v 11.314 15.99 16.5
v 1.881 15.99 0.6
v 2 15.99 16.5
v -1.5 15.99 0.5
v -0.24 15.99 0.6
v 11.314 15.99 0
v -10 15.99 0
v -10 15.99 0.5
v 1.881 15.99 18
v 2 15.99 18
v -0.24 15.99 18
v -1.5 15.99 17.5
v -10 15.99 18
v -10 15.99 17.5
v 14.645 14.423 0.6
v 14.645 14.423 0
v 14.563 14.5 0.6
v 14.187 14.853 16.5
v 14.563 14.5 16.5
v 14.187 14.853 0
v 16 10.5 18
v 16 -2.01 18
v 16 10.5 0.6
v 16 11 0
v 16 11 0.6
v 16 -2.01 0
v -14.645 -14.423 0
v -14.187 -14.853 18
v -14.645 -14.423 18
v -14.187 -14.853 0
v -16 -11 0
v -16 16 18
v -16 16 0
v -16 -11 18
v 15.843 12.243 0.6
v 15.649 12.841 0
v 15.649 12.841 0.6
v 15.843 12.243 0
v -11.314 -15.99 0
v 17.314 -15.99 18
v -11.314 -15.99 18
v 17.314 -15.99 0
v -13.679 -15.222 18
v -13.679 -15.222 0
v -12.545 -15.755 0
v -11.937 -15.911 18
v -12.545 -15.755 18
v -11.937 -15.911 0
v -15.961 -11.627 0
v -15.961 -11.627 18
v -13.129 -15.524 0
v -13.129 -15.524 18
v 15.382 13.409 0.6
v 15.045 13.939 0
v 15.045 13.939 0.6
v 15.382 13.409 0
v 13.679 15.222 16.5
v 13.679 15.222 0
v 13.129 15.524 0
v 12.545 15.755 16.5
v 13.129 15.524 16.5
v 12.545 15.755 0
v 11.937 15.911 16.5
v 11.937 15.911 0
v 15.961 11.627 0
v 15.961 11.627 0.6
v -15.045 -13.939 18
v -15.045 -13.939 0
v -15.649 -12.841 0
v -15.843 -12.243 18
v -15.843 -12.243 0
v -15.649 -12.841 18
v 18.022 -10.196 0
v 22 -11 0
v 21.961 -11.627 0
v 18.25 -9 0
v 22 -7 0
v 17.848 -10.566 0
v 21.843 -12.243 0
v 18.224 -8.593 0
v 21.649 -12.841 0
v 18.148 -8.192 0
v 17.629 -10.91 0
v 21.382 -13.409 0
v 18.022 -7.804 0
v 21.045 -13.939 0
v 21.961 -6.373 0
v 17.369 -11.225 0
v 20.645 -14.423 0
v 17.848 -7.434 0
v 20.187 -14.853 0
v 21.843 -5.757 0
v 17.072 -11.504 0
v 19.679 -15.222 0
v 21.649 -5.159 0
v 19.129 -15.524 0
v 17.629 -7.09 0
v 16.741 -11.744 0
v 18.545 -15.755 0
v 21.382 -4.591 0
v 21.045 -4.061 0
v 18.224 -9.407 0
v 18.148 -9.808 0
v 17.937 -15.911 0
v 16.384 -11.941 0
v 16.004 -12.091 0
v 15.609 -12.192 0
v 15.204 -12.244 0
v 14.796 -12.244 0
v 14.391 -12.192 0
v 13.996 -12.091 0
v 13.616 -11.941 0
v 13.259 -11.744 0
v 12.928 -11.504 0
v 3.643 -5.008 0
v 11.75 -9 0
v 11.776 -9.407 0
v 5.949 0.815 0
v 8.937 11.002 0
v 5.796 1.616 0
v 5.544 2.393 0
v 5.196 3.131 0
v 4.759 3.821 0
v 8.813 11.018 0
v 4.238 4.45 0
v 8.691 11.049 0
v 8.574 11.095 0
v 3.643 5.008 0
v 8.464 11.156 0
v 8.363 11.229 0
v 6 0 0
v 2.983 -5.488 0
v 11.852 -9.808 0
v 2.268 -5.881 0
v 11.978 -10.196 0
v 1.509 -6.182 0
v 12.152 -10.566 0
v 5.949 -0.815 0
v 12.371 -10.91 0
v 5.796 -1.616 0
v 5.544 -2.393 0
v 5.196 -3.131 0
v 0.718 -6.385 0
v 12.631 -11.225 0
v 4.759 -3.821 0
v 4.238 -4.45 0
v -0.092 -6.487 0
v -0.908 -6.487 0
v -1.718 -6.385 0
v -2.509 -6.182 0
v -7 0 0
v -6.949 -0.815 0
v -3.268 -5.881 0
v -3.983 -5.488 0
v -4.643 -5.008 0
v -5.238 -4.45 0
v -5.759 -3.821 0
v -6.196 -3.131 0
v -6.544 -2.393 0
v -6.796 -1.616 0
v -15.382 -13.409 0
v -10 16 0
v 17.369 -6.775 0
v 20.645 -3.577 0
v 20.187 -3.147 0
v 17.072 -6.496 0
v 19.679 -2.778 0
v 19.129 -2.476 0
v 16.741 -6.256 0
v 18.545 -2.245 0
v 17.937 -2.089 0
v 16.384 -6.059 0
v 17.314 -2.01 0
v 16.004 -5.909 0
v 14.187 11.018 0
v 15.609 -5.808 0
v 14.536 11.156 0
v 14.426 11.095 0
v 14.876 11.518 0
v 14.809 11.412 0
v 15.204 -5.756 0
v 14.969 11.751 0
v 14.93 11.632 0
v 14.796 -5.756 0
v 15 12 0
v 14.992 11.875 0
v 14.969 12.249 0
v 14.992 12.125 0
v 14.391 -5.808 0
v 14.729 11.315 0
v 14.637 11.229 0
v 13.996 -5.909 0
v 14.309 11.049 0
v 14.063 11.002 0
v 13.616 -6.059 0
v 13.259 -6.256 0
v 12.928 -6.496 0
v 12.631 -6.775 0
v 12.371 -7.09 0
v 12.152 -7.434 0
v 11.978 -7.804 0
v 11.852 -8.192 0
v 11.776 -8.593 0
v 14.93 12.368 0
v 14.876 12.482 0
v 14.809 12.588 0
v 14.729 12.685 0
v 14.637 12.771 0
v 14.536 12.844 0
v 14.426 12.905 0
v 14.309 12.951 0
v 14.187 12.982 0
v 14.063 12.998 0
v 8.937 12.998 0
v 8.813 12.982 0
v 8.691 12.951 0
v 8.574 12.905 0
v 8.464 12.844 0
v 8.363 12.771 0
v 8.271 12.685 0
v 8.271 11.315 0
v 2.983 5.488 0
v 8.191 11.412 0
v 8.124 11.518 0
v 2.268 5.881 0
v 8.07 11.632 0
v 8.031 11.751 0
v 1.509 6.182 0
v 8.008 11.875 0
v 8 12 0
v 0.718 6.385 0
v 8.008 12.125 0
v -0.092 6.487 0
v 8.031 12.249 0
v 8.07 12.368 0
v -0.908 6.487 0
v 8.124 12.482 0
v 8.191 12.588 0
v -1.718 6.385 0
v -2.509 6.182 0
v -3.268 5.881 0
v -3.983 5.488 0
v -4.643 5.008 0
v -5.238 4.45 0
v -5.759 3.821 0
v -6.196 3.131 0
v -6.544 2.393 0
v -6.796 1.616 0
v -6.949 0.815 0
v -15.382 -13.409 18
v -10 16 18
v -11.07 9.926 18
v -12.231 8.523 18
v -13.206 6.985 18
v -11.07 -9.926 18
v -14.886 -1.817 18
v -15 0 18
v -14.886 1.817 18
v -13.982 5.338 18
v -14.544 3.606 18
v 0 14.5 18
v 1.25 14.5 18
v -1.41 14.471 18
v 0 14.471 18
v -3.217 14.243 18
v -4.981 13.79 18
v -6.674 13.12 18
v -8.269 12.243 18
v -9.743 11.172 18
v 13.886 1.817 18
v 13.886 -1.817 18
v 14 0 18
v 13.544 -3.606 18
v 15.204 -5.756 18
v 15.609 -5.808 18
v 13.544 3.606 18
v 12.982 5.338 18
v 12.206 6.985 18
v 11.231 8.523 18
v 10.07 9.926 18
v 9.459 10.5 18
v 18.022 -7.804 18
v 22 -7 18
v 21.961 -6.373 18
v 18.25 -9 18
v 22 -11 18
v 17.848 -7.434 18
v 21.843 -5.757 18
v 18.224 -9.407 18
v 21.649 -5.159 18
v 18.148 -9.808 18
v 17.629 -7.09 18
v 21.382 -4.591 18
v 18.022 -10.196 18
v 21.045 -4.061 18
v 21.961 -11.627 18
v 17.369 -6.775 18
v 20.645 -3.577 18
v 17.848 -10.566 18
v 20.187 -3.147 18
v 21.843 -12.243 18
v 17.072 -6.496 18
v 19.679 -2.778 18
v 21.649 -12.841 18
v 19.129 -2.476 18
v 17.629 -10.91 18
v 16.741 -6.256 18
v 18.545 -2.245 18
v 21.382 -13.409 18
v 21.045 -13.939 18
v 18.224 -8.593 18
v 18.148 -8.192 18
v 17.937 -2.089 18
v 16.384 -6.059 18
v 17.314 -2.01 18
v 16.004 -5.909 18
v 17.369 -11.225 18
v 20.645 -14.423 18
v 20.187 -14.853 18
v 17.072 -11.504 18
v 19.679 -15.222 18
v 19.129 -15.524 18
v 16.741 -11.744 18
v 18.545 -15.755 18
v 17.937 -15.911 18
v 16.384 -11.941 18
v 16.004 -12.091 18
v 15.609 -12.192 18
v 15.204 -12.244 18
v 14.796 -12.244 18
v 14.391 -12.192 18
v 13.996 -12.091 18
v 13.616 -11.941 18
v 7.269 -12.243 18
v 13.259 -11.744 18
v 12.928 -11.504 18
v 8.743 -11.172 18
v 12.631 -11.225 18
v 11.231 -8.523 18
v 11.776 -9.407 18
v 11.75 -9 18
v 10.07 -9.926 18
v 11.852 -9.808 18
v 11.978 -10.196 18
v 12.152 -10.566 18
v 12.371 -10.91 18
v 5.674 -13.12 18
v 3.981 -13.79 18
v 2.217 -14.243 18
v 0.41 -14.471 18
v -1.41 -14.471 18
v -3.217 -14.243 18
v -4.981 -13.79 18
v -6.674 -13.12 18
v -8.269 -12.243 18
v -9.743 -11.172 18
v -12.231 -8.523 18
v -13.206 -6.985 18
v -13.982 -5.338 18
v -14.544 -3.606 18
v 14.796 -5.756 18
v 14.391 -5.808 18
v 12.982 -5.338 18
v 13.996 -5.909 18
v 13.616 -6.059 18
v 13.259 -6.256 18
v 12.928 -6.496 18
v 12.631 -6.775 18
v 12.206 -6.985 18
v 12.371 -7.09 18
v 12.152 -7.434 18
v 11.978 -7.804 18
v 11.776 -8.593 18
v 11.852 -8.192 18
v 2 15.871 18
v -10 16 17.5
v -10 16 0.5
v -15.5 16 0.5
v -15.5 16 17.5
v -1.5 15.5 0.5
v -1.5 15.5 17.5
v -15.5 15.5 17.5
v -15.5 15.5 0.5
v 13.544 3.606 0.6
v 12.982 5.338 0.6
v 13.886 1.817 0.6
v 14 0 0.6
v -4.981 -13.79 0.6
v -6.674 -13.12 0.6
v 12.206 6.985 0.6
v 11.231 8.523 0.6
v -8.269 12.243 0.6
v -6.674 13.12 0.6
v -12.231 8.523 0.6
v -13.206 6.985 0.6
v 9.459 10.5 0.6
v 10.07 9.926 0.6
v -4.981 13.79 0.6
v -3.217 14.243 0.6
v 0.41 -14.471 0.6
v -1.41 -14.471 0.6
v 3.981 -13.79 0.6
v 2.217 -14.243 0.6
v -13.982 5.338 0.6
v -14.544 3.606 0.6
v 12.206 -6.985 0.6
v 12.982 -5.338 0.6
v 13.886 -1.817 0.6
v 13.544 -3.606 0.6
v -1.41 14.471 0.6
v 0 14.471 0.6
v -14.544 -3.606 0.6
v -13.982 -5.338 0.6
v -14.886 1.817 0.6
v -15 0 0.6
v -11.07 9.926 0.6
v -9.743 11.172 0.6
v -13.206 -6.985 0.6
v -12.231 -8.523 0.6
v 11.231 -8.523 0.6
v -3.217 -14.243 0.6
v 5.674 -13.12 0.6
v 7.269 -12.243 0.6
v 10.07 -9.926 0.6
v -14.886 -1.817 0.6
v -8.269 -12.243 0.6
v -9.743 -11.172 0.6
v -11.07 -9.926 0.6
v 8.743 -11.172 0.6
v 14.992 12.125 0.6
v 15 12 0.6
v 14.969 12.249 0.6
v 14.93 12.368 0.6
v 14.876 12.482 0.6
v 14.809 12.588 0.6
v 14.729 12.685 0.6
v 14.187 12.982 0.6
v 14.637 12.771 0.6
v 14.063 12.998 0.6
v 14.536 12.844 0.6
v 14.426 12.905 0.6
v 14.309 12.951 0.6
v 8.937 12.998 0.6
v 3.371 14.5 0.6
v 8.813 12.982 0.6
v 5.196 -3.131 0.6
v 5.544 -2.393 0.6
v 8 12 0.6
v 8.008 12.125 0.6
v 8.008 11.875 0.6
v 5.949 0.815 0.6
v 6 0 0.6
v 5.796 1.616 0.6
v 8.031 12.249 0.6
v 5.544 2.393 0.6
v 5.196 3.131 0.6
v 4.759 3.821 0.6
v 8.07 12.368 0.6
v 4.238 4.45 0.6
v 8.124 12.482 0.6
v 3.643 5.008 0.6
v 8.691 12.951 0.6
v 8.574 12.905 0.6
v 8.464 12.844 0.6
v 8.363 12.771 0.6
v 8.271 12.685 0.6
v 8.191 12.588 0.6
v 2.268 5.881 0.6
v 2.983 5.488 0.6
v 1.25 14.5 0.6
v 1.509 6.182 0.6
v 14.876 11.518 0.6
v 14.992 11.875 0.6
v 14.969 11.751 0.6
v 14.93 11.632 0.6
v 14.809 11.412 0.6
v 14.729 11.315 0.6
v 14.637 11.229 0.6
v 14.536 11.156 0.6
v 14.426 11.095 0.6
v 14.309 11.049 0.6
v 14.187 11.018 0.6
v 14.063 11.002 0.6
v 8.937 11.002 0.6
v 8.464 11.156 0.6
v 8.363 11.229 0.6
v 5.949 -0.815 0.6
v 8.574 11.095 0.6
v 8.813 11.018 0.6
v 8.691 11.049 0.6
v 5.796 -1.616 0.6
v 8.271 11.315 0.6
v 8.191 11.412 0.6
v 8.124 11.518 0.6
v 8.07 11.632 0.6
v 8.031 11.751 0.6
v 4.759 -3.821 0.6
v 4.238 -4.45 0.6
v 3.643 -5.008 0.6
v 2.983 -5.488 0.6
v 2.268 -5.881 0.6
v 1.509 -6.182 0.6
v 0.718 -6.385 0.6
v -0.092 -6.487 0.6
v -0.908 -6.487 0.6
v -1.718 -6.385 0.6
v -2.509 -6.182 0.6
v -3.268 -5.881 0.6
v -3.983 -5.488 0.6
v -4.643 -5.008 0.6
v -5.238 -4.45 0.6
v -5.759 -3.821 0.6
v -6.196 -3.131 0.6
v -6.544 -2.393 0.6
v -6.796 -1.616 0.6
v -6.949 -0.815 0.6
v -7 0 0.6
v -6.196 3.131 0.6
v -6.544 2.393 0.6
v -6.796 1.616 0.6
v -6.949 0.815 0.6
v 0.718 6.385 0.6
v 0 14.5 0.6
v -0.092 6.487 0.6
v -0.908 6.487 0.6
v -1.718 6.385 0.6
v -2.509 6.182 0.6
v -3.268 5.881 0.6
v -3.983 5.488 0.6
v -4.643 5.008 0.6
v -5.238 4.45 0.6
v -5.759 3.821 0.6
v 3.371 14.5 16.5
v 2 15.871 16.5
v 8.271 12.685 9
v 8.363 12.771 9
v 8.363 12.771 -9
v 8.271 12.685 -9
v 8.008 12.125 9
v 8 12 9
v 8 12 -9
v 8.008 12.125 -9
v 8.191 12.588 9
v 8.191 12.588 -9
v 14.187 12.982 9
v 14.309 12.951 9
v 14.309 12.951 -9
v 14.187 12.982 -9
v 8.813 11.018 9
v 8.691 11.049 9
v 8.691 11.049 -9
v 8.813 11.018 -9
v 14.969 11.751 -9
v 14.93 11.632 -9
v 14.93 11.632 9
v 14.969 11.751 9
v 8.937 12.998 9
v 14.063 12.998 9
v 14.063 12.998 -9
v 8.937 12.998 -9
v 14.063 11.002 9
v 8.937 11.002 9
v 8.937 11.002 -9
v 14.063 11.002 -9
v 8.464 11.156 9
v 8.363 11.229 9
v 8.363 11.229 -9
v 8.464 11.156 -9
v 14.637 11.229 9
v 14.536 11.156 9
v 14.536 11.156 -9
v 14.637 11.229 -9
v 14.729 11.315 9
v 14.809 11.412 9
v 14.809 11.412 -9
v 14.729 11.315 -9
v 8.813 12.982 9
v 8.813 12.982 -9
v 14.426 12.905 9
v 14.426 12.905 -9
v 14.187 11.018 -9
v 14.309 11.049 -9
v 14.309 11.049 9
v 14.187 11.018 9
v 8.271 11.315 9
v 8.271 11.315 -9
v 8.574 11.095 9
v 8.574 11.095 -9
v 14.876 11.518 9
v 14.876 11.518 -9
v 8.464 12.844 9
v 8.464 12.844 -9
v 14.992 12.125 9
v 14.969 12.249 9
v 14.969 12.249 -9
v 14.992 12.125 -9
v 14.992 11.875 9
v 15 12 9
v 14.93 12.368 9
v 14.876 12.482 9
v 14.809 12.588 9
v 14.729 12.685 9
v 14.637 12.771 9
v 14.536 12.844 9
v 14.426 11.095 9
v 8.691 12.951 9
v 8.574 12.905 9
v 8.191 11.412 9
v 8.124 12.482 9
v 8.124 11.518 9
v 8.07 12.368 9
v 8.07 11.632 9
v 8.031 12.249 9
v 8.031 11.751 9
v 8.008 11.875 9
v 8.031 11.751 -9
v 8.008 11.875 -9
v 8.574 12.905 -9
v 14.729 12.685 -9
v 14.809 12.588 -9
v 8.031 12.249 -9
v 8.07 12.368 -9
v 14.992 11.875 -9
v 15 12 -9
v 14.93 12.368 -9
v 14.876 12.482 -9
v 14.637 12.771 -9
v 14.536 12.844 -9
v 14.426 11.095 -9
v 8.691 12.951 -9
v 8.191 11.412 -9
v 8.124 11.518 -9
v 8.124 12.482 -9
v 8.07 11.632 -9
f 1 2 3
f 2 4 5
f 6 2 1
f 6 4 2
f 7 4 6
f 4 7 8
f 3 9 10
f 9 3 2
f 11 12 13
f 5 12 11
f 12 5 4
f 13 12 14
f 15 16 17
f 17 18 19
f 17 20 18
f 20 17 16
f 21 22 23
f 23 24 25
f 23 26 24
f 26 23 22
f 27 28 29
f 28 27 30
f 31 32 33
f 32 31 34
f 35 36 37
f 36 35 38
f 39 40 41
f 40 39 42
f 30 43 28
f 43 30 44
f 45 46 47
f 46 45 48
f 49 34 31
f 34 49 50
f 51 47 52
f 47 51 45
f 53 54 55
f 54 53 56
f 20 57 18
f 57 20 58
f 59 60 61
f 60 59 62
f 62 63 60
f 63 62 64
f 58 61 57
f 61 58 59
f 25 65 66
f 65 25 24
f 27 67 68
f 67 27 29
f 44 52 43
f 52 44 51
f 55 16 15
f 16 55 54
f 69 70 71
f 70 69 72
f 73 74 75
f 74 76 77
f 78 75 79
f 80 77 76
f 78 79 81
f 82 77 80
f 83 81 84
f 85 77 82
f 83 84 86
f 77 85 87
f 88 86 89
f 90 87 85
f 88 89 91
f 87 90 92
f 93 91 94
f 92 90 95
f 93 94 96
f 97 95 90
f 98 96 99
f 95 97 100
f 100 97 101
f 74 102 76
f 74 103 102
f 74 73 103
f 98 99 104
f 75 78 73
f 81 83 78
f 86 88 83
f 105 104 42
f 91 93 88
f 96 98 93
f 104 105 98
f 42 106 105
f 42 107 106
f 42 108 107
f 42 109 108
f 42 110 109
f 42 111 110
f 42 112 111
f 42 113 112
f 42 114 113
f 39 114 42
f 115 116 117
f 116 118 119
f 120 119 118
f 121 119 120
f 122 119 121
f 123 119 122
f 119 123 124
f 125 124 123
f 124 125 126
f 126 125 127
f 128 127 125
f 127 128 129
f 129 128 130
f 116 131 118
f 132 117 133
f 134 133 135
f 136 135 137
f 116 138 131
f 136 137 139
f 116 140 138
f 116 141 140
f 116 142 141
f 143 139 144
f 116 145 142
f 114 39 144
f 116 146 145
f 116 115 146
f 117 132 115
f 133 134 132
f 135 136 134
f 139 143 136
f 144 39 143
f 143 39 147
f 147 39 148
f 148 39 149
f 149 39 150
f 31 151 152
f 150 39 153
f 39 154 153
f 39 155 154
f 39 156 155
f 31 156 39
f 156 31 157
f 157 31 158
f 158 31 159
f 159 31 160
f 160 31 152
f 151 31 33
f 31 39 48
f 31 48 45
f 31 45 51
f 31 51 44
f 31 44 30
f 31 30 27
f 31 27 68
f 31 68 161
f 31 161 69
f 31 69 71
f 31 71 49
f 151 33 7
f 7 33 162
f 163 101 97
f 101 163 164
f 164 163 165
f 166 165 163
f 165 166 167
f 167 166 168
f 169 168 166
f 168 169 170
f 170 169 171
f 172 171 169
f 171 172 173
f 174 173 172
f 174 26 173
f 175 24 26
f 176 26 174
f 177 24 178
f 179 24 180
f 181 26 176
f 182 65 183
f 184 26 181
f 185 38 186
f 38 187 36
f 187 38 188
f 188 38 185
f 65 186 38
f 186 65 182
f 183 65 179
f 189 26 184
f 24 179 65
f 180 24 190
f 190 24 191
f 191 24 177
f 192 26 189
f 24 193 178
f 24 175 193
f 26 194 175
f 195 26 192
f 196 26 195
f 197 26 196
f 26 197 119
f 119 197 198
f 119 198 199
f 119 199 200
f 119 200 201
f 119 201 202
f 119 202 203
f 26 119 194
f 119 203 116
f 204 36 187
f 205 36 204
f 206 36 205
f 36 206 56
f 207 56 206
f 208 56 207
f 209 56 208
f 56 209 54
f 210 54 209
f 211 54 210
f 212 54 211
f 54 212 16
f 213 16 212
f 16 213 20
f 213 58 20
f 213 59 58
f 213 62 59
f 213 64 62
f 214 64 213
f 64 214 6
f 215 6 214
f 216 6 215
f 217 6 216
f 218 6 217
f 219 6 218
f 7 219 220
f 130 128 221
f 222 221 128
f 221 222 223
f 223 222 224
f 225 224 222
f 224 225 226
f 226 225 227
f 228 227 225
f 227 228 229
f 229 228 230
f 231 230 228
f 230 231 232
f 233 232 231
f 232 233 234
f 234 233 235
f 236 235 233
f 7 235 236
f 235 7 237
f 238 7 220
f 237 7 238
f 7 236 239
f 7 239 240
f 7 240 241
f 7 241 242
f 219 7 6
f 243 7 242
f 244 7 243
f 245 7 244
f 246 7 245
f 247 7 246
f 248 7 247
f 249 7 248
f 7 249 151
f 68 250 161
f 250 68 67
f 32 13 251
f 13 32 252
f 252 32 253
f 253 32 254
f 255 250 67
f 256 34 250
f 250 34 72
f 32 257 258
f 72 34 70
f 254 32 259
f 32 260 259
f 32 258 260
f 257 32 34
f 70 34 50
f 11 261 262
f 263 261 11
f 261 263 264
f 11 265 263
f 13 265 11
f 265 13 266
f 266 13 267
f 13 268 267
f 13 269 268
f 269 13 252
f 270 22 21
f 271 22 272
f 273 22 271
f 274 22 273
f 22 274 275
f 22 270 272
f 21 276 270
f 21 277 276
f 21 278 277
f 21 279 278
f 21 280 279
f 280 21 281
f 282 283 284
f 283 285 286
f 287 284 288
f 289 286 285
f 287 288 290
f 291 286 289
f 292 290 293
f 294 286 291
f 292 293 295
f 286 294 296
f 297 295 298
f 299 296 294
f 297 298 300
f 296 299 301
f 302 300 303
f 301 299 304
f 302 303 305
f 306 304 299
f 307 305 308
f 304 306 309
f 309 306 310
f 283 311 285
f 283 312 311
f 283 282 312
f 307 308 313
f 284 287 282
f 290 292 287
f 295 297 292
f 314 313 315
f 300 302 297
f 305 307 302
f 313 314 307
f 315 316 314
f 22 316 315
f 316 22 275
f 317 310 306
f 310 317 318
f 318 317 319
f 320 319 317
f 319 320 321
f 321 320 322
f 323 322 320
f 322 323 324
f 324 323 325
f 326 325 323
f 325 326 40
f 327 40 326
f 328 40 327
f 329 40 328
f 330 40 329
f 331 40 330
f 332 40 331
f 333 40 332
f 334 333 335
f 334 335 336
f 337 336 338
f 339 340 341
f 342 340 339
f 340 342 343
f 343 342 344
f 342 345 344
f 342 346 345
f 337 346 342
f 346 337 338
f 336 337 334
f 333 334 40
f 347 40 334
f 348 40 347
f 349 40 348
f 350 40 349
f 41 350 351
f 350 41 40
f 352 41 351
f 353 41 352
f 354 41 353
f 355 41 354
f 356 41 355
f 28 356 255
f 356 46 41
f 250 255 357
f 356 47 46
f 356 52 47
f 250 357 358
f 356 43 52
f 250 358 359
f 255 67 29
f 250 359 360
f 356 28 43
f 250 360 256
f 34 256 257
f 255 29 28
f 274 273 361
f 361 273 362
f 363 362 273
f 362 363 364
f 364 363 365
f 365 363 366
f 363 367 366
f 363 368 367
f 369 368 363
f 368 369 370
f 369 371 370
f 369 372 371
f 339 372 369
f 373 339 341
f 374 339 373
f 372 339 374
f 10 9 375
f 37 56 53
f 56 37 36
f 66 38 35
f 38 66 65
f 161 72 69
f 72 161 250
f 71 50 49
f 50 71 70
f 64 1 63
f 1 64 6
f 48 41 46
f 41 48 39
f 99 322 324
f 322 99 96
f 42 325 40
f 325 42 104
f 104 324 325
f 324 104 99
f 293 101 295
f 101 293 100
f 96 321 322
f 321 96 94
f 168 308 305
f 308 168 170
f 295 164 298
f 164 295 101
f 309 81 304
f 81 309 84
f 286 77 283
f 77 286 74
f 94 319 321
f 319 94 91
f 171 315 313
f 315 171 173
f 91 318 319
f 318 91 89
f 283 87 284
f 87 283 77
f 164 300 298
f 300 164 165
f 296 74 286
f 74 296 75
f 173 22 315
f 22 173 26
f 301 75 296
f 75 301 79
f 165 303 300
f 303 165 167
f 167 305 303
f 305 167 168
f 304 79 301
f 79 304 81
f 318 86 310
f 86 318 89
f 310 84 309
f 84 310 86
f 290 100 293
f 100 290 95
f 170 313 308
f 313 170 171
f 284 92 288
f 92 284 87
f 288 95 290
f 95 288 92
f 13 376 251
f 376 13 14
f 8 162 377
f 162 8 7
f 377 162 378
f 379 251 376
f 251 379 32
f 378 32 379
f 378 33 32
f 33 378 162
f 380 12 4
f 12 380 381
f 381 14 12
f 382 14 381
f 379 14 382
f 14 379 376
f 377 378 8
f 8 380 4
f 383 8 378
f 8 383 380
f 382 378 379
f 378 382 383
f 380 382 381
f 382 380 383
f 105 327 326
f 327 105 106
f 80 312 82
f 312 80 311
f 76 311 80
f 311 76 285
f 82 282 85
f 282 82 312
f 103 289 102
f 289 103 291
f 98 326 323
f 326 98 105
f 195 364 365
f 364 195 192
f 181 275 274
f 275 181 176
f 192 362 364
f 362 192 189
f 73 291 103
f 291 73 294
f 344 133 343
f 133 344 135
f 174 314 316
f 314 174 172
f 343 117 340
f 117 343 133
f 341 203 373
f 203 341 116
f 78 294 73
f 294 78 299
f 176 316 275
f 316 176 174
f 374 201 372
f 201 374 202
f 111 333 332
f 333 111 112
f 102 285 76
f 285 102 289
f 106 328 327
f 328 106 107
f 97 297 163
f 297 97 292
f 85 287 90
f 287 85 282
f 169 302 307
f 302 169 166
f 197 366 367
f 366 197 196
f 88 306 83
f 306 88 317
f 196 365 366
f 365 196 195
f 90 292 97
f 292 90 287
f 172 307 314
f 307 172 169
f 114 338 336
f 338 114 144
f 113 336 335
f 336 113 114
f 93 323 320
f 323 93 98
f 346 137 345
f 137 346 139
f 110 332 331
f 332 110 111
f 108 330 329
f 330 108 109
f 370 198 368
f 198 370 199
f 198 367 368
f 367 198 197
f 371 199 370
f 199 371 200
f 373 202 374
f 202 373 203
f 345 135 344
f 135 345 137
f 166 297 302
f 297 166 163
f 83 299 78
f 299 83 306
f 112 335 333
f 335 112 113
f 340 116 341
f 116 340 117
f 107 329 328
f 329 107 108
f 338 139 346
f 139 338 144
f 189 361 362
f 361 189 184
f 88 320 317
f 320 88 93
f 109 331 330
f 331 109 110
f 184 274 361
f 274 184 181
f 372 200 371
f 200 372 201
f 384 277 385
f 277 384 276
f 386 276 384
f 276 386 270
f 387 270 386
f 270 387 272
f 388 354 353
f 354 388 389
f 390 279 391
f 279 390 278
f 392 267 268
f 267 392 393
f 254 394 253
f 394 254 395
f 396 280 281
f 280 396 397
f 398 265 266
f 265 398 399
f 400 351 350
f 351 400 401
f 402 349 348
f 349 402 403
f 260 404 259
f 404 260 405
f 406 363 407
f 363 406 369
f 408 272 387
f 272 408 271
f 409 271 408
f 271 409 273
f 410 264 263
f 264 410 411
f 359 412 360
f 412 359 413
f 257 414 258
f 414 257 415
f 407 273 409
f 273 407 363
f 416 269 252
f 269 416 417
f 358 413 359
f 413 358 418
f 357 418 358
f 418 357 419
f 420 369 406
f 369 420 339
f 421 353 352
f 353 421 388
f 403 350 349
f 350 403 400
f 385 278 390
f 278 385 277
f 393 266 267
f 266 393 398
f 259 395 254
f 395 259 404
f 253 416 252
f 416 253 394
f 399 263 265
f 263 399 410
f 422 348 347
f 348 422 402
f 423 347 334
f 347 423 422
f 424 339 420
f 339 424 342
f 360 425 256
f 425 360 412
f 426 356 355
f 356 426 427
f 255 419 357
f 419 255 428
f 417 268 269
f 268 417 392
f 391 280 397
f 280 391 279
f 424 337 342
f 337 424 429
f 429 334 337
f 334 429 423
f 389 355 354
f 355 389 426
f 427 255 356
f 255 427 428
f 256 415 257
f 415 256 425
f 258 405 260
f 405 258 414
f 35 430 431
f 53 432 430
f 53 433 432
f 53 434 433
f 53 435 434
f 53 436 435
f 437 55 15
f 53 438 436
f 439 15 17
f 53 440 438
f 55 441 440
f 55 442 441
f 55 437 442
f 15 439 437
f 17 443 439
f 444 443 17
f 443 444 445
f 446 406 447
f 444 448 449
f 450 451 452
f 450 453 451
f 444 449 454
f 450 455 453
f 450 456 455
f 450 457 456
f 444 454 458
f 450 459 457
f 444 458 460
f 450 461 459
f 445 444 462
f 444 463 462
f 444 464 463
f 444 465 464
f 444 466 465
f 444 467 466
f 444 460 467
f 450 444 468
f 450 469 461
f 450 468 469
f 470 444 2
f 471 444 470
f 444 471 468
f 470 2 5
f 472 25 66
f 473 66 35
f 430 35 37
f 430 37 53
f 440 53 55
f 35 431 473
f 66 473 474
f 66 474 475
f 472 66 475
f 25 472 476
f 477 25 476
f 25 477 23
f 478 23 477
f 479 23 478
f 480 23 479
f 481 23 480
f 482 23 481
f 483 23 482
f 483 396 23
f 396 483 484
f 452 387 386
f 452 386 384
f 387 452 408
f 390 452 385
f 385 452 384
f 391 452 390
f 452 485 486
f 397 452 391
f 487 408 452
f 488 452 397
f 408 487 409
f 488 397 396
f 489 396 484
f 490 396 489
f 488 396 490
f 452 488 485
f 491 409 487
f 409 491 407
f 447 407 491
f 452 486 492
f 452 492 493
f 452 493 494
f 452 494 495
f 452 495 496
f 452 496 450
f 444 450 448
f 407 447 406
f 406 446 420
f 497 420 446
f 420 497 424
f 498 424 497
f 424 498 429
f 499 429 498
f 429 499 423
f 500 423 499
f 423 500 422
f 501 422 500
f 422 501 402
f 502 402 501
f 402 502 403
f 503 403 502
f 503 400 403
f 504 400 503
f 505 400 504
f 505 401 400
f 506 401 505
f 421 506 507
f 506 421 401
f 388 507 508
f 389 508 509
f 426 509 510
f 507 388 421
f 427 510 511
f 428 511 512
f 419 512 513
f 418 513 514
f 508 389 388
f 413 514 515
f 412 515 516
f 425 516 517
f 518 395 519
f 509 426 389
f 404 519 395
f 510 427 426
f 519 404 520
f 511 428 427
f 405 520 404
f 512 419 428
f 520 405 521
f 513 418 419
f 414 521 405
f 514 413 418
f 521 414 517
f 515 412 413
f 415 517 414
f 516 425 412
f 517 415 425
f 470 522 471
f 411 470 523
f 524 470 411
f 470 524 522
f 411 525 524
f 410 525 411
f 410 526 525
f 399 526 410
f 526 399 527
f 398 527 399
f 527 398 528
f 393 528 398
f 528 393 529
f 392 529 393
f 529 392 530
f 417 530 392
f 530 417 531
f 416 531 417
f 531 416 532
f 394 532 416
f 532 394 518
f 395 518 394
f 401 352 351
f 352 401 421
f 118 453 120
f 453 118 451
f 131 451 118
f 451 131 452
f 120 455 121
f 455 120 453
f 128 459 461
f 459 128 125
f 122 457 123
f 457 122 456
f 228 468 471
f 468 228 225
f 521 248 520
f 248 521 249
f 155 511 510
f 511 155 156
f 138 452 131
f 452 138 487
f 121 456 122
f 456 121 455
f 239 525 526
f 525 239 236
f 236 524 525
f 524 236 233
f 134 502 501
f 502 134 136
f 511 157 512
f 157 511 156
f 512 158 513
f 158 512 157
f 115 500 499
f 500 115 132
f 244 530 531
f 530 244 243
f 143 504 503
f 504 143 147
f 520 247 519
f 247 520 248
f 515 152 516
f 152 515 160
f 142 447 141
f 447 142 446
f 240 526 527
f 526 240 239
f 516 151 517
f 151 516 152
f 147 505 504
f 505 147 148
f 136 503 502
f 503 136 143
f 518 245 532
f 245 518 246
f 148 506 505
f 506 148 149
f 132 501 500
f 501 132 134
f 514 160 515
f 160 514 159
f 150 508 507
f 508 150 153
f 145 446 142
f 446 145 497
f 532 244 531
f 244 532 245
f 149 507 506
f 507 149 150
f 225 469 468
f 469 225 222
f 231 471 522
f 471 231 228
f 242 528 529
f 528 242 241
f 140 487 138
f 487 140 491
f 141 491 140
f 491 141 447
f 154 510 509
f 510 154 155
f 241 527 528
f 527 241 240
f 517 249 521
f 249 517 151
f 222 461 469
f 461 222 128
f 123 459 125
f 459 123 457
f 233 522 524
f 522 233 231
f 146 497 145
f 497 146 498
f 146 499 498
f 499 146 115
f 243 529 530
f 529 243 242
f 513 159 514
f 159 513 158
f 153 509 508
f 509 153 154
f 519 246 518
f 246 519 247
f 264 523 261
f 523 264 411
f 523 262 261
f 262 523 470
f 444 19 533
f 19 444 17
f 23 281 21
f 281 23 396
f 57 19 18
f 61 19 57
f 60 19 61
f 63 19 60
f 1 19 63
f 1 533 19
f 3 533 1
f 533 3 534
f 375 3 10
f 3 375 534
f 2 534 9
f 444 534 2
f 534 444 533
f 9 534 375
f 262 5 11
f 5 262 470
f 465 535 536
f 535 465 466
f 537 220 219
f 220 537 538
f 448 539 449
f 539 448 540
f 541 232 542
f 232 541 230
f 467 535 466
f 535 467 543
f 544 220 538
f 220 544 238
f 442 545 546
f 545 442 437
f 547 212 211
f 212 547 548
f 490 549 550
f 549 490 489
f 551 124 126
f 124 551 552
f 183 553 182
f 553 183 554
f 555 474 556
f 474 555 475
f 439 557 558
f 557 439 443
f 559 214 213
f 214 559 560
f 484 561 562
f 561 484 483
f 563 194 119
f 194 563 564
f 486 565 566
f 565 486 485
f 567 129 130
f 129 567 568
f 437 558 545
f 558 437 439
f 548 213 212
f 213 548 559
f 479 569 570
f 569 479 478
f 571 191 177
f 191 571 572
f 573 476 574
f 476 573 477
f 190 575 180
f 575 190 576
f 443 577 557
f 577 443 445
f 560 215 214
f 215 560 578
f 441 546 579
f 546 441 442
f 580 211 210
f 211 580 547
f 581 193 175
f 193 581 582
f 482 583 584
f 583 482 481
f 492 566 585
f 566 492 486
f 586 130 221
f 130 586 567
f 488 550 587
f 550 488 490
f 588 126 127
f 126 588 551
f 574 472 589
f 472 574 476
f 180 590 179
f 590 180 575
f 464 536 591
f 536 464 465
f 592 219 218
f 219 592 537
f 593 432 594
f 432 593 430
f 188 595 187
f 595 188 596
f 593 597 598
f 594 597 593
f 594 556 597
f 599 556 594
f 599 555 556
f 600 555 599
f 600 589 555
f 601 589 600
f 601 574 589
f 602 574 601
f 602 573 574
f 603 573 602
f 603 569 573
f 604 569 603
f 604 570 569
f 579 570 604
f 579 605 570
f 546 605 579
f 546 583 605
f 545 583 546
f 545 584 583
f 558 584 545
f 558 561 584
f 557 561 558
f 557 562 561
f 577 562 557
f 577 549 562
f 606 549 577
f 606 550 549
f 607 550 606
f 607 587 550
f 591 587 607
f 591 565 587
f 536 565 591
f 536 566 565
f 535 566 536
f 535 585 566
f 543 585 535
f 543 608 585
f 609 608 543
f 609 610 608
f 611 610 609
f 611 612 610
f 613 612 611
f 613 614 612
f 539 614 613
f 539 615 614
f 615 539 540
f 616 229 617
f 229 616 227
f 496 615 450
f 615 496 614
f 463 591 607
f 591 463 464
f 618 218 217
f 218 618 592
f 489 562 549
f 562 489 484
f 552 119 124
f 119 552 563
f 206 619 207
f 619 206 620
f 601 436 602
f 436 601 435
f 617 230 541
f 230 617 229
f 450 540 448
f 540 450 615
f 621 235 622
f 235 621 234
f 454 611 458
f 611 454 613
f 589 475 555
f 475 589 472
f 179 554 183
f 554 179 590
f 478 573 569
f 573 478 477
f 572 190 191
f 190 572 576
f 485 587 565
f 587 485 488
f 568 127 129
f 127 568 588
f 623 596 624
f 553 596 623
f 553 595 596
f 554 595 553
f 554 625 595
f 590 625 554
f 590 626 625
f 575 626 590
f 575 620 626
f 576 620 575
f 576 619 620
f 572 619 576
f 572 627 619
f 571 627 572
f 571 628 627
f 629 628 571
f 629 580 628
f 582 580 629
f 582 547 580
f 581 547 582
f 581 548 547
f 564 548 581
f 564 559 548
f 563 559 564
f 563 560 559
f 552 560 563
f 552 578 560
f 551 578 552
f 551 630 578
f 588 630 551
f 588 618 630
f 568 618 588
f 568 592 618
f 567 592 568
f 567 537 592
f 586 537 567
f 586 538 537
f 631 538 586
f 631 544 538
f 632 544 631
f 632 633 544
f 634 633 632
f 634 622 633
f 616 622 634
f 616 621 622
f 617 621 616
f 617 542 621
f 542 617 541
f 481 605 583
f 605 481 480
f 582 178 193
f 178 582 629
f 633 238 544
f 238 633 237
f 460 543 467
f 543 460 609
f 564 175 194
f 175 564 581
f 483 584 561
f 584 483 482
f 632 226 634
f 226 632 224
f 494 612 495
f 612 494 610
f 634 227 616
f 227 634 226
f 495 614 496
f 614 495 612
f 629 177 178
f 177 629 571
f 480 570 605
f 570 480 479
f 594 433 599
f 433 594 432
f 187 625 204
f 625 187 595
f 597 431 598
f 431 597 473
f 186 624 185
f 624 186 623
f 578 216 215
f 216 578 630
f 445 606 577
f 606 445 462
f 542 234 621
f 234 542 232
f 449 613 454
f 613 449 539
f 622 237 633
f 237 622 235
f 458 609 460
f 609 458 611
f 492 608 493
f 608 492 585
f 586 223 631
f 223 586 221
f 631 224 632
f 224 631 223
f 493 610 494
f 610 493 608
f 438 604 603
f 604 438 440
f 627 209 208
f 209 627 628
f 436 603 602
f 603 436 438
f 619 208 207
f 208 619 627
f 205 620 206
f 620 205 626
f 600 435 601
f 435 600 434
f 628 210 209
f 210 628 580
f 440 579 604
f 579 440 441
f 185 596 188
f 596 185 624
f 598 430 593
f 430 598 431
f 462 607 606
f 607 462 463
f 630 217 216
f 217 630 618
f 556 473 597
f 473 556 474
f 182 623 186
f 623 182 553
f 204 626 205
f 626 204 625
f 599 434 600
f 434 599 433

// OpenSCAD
$fn = 50;


union() {
	difference() {
		union() {
			hull() {
				translate(v = [-11.0000000000, 11.0000000000, 0]) {
					cylinder(h = 18, r = 5);
				}
				translate(v = [11.0000000000, 11.0000000000, 0]) {
					cylinder(h = 18, r = 5);
				}
				translate(v = [-11.0000000000, -11.0000000000, 0]) {
					cylinder(h = 18, r = 5);
				}
				translate(v = [11.0000000000, -11.0000000000, 0]) {
					cylinder(h = 18, r = 5);
				}
			}
			translate(v = [7.5000000000, -9.0000000000, 0]) {
				hull() {
					translate(v = [-9.5000000000, 2.0000000000, 0]) {
						cylinder(h = 18, r = 5);
					}
					translate(v = [9.5000000000, 2.0000000000, 0]) {
						cylinder(h = 18, r = 5);
					}
					translate(v = [-9.5000000000, -2.0000000000, 0]) {
						cylinder(h = 18, r = 5);
					}
					translate(v = [9.5000000000, -2.0000000000, 0]) {
						cylinder(h = 18, r = 5);
					}
				}
			}
			translate(v = [-16.0000000000, 10.0000000000, 0]) {
				cube(size = [6, 6, 18]);
			}
		}
		union() {
			translate(v = [-15.5000000000, 15.5000000000, 0.5000000000]) {
				cube(size = [14, 0.5000000000, 17.0000000000]);
			}
			translate(v = [15.0000000000, -9.0000000000, -100.0000000000]) {
				cylinder(h = 200, r = 3.2500000000);
			}
			translate(v = [-0.5000000000, 0.0000000000, 0.6000000000]) {
				cylinder(h = 20.4000000000, r = 14.5000000000);
			}
			translate(v = [-0.5000000000, 0.0000000000, -9.0000000000]) {
				cylinder(h = 18, r = 6.5000000000);
			}
			translate(v = [0.0000000000, 10.5000000000, 0.6000000000]) {
				cube(size = [16.0000000000, 4, 20.4000000000]);
			}
			translate(v = [2.0000000000, 10.5000000000, 16.5000000000]) {
				cube(size = [14.0000000000, 7, 1.5000000000]);
			}
			translate(v = [-3.0000000000, 18.7500000000, 0.6000000000]) {
				rotate(a = [0, 0, -45]) {
					cube(size = [10, 1.5000000000, 20.4000000000]);
				}
			}
			translate(v = [2.2500000000, 11.0000000000, 0.6000000000]) {
				cube(size = [7.5000000000, 2, 17.4000000000]);
			}
		}
	}
	union() {
		translate(v = [11.5000000000, 12, -9.0000000000]) {
			rotate(a = [0, 0, 0]) {
				difference() {
					union() {
						hull() {
							translate(v = [2.5000000000, 0, 0]) {
								cylinder(h = 18, r = 1.0000000000, r1 = 1.0000000000, r2 = 1.0000000000);
							}
							translate(v = [-2.5000000000, 0, 0]) {
								cylinder(h = 18, r = 1.0000000000, r1 = 1.0000000000, r2 = 1.0000000000);
							}
						}
					}
					union();
				}
			}
		}
	}
}
